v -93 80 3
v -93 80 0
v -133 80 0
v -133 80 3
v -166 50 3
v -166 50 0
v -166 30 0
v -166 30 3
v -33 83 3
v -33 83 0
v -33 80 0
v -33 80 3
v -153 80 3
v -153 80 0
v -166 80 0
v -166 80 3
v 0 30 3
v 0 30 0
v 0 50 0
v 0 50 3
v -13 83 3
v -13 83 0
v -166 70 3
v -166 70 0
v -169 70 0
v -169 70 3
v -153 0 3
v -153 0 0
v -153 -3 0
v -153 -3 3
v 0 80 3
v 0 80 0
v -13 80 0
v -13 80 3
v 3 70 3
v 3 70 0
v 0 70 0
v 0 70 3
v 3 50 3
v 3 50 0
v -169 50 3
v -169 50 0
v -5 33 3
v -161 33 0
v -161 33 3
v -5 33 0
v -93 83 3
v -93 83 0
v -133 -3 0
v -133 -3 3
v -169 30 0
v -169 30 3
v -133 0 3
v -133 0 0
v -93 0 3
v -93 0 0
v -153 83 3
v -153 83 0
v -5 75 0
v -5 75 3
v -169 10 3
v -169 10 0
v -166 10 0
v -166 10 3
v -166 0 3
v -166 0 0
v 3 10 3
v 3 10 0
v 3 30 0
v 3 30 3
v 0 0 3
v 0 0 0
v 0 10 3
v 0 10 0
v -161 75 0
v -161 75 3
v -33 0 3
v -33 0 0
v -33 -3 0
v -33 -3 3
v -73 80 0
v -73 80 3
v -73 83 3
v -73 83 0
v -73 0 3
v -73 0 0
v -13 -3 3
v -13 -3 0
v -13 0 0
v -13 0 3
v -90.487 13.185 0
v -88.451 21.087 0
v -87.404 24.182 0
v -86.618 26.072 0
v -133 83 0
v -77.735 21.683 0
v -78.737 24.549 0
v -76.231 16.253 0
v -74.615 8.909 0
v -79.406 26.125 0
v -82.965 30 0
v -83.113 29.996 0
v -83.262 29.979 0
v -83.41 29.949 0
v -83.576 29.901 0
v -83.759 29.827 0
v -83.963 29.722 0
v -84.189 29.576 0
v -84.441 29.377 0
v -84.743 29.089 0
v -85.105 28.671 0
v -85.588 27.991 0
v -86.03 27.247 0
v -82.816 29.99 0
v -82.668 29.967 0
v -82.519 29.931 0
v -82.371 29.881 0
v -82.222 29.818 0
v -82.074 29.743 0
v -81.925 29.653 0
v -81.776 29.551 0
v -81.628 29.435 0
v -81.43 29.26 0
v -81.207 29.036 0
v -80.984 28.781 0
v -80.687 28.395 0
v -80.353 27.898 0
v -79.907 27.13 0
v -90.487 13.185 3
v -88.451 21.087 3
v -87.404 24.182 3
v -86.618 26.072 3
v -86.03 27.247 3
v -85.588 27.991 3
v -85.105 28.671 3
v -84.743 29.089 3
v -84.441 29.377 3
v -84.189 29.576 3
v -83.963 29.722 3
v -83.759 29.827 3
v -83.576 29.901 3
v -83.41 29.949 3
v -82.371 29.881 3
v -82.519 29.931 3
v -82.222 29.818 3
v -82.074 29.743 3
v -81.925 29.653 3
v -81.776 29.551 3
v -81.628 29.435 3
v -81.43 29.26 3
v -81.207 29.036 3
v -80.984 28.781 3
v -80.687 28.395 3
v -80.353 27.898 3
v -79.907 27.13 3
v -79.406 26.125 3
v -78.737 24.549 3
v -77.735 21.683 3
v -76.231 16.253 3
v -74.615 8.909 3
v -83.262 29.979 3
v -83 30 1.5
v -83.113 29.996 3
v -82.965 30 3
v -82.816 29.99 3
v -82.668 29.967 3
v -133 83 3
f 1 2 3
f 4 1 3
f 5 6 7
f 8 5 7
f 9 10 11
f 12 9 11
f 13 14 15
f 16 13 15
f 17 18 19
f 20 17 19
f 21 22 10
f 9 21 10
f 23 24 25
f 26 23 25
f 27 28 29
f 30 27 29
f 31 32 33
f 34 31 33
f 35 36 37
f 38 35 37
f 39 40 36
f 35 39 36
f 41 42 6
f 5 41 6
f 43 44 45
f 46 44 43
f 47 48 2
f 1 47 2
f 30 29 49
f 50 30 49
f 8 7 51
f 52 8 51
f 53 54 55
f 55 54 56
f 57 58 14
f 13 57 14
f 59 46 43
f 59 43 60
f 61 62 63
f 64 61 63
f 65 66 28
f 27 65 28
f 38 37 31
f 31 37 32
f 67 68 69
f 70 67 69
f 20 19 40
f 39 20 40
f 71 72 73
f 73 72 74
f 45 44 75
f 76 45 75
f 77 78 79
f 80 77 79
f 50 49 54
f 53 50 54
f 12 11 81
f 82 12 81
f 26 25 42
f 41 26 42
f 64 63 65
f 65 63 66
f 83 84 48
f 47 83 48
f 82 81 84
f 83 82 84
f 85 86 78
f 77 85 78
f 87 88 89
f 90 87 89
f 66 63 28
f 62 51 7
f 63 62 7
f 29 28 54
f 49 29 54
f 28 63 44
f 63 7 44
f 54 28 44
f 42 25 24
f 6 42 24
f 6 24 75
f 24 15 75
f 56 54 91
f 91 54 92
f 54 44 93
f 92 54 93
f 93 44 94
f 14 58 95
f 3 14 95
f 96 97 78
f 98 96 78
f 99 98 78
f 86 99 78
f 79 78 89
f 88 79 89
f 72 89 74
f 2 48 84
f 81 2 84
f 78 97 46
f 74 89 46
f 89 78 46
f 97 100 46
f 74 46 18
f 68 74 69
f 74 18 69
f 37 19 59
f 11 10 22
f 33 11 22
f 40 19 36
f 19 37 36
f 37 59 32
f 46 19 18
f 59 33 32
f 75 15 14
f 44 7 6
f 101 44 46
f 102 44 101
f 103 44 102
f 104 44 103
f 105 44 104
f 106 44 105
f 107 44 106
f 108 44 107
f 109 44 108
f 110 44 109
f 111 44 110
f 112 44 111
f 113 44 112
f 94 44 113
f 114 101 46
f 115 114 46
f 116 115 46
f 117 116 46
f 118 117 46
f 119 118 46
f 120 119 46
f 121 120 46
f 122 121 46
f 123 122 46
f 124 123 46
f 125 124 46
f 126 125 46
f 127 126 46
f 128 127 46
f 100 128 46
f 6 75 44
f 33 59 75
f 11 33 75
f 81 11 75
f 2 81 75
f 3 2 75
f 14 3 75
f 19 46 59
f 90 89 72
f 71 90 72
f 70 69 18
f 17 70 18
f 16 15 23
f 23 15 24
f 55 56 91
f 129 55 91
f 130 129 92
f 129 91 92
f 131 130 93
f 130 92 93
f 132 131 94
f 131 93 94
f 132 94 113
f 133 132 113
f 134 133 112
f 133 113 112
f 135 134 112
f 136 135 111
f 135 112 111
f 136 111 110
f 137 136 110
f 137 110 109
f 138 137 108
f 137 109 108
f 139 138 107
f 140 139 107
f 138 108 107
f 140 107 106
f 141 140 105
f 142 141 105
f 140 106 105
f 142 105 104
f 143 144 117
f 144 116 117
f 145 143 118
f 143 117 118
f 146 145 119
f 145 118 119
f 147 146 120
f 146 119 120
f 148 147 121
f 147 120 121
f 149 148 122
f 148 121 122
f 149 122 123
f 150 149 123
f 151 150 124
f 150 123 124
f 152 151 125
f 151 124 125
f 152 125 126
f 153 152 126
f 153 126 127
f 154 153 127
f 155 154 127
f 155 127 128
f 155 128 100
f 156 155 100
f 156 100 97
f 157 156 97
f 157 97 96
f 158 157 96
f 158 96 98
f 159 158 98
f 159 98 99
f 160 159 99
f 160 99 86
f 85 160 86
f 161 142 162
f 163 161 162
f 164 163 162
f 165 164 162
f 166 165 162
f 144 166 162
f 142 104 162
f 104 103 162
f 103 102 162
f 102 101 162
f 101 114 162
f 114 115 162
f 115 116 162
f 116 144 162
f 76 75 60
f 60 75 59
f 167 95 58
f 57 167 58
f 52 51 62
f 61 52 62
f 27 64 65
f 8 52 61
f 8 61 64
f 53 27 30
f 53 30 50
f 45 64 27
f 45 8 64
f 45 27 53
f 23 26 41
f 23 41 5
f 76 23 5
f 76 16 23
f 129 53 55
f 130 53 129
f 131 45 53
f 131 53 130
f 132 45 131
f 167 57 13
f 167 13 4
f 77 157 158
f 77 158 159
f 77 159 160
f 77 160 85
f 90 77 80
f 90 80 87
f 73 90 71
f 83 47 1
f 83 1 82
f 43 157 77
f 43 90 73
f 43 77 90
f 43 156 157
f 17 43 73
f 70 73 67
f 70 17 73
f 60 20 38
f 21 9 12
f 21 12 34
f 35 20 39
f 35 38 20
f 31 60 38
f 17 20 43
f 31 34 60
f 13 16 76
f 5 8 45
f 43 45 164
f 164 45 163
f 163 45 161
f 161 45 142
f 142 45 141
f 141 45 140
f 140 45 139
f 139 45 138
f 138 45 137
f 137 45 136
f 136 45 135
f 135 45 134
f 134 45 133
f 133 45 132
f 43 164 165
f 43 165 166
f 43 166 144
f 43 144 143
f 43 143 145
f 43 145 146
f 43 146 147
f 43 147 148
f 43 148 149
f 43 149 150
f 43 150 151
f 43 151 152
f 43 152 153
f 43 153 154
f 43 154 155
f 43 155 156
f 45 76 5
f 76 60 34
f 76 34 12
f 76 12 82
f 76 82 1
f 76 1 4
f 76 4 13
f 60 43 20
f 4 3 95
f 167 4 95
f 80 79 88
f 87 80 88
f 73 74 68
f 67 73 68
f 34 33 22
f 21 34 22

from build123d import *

# Parameters (mm, degrees)
ESQUISSE1_W        = 156
ESQUISSE1_H        = 42.000000092
BOSS_EXTRU_1_DEPTH = 3


with BuildPart() as part:
    # Esquisse1 → Boss.-Extru.1 (new body)
    with BuildSketch(Plane.XY):
        with BuildLine():
            Line((0, 0), (0, 10))
            Line((0, 10), (3, 10))
            Line((3, 10), (3, 30))
            Line((3, 30), (0, 30))
            Line((0, 30), (0, 50))
            Line((0, 50), (3, 50))
            Line((3, 50), (3, 70))
            Line((3, 70), (0, 70))
            Line((0, 70), (0, 80))
            Line((0, 80), (-13, 80))
            Line((-13, 80), (-13, 83))
            Line((-13, 83), (-33, 83))
            Line((-33, 83), (-33, 80))
            Line((-33, 80), (-73, 80))
            Line((-73, 80), (-73, 83))
            Line((-73, 83), (-93, 83))
            Line((-93, 83), (-93, 80))
            Line((-93, 80), (-133, 80))
            Line((-133, 80), (-133, 83))
            Line((-133, 83), (-153, 83))
            Line((-153, 83), (-153, 80))
            Line((-153, 80), (-166, 80))
            Line((-166, 80), (-166, 70))
            Line((-166, 70), (-169, 70))
            Line((-169, 70), (-169, 50))
            Line((-169, 50), (-166, 50))
            Line((-166, 50), (-166, 30))
            Line((-166, 30), (-169, 30))
            Line((-169, 30), (-169, 10))
            Line((-169, 10), (-166, 10))
            Line((-166, 10), (-166, 0))
            Line((-166, 0), (-153, 0))
            Line((-153, 0), (-153, -3))
            Line((-153, -3), (-133, -3))
            Line((-133, -3), (-133, 0))
            Line((-133, 0), (-92.99999998, 0))
            add(Edge.make_bspline(
                [(-92.99999998, 0), (-83, 59.999999815), (-73.00000002, 0)],
                knots=[0, 0, 0, 1, 1, 1], degree=2))
            Line((-73.00000002, 0), (-33, 0))
            Line((-33, 0), (-33, -3))
            Line((-33, -3), (-13, -3))
            Line((-13, -3), (-13, 0))
            Line((-13, 0), (0, 0))
        make_face()
        with Locations((-83, 53.999999954)):
            Rectangle(ESQUISSE1_W, ESQUISSE1_H, mode=Mode.SUBTRACT)
    extrude(amount=BOSS_EXTRU_1_DEPTH)


solid = part.part
